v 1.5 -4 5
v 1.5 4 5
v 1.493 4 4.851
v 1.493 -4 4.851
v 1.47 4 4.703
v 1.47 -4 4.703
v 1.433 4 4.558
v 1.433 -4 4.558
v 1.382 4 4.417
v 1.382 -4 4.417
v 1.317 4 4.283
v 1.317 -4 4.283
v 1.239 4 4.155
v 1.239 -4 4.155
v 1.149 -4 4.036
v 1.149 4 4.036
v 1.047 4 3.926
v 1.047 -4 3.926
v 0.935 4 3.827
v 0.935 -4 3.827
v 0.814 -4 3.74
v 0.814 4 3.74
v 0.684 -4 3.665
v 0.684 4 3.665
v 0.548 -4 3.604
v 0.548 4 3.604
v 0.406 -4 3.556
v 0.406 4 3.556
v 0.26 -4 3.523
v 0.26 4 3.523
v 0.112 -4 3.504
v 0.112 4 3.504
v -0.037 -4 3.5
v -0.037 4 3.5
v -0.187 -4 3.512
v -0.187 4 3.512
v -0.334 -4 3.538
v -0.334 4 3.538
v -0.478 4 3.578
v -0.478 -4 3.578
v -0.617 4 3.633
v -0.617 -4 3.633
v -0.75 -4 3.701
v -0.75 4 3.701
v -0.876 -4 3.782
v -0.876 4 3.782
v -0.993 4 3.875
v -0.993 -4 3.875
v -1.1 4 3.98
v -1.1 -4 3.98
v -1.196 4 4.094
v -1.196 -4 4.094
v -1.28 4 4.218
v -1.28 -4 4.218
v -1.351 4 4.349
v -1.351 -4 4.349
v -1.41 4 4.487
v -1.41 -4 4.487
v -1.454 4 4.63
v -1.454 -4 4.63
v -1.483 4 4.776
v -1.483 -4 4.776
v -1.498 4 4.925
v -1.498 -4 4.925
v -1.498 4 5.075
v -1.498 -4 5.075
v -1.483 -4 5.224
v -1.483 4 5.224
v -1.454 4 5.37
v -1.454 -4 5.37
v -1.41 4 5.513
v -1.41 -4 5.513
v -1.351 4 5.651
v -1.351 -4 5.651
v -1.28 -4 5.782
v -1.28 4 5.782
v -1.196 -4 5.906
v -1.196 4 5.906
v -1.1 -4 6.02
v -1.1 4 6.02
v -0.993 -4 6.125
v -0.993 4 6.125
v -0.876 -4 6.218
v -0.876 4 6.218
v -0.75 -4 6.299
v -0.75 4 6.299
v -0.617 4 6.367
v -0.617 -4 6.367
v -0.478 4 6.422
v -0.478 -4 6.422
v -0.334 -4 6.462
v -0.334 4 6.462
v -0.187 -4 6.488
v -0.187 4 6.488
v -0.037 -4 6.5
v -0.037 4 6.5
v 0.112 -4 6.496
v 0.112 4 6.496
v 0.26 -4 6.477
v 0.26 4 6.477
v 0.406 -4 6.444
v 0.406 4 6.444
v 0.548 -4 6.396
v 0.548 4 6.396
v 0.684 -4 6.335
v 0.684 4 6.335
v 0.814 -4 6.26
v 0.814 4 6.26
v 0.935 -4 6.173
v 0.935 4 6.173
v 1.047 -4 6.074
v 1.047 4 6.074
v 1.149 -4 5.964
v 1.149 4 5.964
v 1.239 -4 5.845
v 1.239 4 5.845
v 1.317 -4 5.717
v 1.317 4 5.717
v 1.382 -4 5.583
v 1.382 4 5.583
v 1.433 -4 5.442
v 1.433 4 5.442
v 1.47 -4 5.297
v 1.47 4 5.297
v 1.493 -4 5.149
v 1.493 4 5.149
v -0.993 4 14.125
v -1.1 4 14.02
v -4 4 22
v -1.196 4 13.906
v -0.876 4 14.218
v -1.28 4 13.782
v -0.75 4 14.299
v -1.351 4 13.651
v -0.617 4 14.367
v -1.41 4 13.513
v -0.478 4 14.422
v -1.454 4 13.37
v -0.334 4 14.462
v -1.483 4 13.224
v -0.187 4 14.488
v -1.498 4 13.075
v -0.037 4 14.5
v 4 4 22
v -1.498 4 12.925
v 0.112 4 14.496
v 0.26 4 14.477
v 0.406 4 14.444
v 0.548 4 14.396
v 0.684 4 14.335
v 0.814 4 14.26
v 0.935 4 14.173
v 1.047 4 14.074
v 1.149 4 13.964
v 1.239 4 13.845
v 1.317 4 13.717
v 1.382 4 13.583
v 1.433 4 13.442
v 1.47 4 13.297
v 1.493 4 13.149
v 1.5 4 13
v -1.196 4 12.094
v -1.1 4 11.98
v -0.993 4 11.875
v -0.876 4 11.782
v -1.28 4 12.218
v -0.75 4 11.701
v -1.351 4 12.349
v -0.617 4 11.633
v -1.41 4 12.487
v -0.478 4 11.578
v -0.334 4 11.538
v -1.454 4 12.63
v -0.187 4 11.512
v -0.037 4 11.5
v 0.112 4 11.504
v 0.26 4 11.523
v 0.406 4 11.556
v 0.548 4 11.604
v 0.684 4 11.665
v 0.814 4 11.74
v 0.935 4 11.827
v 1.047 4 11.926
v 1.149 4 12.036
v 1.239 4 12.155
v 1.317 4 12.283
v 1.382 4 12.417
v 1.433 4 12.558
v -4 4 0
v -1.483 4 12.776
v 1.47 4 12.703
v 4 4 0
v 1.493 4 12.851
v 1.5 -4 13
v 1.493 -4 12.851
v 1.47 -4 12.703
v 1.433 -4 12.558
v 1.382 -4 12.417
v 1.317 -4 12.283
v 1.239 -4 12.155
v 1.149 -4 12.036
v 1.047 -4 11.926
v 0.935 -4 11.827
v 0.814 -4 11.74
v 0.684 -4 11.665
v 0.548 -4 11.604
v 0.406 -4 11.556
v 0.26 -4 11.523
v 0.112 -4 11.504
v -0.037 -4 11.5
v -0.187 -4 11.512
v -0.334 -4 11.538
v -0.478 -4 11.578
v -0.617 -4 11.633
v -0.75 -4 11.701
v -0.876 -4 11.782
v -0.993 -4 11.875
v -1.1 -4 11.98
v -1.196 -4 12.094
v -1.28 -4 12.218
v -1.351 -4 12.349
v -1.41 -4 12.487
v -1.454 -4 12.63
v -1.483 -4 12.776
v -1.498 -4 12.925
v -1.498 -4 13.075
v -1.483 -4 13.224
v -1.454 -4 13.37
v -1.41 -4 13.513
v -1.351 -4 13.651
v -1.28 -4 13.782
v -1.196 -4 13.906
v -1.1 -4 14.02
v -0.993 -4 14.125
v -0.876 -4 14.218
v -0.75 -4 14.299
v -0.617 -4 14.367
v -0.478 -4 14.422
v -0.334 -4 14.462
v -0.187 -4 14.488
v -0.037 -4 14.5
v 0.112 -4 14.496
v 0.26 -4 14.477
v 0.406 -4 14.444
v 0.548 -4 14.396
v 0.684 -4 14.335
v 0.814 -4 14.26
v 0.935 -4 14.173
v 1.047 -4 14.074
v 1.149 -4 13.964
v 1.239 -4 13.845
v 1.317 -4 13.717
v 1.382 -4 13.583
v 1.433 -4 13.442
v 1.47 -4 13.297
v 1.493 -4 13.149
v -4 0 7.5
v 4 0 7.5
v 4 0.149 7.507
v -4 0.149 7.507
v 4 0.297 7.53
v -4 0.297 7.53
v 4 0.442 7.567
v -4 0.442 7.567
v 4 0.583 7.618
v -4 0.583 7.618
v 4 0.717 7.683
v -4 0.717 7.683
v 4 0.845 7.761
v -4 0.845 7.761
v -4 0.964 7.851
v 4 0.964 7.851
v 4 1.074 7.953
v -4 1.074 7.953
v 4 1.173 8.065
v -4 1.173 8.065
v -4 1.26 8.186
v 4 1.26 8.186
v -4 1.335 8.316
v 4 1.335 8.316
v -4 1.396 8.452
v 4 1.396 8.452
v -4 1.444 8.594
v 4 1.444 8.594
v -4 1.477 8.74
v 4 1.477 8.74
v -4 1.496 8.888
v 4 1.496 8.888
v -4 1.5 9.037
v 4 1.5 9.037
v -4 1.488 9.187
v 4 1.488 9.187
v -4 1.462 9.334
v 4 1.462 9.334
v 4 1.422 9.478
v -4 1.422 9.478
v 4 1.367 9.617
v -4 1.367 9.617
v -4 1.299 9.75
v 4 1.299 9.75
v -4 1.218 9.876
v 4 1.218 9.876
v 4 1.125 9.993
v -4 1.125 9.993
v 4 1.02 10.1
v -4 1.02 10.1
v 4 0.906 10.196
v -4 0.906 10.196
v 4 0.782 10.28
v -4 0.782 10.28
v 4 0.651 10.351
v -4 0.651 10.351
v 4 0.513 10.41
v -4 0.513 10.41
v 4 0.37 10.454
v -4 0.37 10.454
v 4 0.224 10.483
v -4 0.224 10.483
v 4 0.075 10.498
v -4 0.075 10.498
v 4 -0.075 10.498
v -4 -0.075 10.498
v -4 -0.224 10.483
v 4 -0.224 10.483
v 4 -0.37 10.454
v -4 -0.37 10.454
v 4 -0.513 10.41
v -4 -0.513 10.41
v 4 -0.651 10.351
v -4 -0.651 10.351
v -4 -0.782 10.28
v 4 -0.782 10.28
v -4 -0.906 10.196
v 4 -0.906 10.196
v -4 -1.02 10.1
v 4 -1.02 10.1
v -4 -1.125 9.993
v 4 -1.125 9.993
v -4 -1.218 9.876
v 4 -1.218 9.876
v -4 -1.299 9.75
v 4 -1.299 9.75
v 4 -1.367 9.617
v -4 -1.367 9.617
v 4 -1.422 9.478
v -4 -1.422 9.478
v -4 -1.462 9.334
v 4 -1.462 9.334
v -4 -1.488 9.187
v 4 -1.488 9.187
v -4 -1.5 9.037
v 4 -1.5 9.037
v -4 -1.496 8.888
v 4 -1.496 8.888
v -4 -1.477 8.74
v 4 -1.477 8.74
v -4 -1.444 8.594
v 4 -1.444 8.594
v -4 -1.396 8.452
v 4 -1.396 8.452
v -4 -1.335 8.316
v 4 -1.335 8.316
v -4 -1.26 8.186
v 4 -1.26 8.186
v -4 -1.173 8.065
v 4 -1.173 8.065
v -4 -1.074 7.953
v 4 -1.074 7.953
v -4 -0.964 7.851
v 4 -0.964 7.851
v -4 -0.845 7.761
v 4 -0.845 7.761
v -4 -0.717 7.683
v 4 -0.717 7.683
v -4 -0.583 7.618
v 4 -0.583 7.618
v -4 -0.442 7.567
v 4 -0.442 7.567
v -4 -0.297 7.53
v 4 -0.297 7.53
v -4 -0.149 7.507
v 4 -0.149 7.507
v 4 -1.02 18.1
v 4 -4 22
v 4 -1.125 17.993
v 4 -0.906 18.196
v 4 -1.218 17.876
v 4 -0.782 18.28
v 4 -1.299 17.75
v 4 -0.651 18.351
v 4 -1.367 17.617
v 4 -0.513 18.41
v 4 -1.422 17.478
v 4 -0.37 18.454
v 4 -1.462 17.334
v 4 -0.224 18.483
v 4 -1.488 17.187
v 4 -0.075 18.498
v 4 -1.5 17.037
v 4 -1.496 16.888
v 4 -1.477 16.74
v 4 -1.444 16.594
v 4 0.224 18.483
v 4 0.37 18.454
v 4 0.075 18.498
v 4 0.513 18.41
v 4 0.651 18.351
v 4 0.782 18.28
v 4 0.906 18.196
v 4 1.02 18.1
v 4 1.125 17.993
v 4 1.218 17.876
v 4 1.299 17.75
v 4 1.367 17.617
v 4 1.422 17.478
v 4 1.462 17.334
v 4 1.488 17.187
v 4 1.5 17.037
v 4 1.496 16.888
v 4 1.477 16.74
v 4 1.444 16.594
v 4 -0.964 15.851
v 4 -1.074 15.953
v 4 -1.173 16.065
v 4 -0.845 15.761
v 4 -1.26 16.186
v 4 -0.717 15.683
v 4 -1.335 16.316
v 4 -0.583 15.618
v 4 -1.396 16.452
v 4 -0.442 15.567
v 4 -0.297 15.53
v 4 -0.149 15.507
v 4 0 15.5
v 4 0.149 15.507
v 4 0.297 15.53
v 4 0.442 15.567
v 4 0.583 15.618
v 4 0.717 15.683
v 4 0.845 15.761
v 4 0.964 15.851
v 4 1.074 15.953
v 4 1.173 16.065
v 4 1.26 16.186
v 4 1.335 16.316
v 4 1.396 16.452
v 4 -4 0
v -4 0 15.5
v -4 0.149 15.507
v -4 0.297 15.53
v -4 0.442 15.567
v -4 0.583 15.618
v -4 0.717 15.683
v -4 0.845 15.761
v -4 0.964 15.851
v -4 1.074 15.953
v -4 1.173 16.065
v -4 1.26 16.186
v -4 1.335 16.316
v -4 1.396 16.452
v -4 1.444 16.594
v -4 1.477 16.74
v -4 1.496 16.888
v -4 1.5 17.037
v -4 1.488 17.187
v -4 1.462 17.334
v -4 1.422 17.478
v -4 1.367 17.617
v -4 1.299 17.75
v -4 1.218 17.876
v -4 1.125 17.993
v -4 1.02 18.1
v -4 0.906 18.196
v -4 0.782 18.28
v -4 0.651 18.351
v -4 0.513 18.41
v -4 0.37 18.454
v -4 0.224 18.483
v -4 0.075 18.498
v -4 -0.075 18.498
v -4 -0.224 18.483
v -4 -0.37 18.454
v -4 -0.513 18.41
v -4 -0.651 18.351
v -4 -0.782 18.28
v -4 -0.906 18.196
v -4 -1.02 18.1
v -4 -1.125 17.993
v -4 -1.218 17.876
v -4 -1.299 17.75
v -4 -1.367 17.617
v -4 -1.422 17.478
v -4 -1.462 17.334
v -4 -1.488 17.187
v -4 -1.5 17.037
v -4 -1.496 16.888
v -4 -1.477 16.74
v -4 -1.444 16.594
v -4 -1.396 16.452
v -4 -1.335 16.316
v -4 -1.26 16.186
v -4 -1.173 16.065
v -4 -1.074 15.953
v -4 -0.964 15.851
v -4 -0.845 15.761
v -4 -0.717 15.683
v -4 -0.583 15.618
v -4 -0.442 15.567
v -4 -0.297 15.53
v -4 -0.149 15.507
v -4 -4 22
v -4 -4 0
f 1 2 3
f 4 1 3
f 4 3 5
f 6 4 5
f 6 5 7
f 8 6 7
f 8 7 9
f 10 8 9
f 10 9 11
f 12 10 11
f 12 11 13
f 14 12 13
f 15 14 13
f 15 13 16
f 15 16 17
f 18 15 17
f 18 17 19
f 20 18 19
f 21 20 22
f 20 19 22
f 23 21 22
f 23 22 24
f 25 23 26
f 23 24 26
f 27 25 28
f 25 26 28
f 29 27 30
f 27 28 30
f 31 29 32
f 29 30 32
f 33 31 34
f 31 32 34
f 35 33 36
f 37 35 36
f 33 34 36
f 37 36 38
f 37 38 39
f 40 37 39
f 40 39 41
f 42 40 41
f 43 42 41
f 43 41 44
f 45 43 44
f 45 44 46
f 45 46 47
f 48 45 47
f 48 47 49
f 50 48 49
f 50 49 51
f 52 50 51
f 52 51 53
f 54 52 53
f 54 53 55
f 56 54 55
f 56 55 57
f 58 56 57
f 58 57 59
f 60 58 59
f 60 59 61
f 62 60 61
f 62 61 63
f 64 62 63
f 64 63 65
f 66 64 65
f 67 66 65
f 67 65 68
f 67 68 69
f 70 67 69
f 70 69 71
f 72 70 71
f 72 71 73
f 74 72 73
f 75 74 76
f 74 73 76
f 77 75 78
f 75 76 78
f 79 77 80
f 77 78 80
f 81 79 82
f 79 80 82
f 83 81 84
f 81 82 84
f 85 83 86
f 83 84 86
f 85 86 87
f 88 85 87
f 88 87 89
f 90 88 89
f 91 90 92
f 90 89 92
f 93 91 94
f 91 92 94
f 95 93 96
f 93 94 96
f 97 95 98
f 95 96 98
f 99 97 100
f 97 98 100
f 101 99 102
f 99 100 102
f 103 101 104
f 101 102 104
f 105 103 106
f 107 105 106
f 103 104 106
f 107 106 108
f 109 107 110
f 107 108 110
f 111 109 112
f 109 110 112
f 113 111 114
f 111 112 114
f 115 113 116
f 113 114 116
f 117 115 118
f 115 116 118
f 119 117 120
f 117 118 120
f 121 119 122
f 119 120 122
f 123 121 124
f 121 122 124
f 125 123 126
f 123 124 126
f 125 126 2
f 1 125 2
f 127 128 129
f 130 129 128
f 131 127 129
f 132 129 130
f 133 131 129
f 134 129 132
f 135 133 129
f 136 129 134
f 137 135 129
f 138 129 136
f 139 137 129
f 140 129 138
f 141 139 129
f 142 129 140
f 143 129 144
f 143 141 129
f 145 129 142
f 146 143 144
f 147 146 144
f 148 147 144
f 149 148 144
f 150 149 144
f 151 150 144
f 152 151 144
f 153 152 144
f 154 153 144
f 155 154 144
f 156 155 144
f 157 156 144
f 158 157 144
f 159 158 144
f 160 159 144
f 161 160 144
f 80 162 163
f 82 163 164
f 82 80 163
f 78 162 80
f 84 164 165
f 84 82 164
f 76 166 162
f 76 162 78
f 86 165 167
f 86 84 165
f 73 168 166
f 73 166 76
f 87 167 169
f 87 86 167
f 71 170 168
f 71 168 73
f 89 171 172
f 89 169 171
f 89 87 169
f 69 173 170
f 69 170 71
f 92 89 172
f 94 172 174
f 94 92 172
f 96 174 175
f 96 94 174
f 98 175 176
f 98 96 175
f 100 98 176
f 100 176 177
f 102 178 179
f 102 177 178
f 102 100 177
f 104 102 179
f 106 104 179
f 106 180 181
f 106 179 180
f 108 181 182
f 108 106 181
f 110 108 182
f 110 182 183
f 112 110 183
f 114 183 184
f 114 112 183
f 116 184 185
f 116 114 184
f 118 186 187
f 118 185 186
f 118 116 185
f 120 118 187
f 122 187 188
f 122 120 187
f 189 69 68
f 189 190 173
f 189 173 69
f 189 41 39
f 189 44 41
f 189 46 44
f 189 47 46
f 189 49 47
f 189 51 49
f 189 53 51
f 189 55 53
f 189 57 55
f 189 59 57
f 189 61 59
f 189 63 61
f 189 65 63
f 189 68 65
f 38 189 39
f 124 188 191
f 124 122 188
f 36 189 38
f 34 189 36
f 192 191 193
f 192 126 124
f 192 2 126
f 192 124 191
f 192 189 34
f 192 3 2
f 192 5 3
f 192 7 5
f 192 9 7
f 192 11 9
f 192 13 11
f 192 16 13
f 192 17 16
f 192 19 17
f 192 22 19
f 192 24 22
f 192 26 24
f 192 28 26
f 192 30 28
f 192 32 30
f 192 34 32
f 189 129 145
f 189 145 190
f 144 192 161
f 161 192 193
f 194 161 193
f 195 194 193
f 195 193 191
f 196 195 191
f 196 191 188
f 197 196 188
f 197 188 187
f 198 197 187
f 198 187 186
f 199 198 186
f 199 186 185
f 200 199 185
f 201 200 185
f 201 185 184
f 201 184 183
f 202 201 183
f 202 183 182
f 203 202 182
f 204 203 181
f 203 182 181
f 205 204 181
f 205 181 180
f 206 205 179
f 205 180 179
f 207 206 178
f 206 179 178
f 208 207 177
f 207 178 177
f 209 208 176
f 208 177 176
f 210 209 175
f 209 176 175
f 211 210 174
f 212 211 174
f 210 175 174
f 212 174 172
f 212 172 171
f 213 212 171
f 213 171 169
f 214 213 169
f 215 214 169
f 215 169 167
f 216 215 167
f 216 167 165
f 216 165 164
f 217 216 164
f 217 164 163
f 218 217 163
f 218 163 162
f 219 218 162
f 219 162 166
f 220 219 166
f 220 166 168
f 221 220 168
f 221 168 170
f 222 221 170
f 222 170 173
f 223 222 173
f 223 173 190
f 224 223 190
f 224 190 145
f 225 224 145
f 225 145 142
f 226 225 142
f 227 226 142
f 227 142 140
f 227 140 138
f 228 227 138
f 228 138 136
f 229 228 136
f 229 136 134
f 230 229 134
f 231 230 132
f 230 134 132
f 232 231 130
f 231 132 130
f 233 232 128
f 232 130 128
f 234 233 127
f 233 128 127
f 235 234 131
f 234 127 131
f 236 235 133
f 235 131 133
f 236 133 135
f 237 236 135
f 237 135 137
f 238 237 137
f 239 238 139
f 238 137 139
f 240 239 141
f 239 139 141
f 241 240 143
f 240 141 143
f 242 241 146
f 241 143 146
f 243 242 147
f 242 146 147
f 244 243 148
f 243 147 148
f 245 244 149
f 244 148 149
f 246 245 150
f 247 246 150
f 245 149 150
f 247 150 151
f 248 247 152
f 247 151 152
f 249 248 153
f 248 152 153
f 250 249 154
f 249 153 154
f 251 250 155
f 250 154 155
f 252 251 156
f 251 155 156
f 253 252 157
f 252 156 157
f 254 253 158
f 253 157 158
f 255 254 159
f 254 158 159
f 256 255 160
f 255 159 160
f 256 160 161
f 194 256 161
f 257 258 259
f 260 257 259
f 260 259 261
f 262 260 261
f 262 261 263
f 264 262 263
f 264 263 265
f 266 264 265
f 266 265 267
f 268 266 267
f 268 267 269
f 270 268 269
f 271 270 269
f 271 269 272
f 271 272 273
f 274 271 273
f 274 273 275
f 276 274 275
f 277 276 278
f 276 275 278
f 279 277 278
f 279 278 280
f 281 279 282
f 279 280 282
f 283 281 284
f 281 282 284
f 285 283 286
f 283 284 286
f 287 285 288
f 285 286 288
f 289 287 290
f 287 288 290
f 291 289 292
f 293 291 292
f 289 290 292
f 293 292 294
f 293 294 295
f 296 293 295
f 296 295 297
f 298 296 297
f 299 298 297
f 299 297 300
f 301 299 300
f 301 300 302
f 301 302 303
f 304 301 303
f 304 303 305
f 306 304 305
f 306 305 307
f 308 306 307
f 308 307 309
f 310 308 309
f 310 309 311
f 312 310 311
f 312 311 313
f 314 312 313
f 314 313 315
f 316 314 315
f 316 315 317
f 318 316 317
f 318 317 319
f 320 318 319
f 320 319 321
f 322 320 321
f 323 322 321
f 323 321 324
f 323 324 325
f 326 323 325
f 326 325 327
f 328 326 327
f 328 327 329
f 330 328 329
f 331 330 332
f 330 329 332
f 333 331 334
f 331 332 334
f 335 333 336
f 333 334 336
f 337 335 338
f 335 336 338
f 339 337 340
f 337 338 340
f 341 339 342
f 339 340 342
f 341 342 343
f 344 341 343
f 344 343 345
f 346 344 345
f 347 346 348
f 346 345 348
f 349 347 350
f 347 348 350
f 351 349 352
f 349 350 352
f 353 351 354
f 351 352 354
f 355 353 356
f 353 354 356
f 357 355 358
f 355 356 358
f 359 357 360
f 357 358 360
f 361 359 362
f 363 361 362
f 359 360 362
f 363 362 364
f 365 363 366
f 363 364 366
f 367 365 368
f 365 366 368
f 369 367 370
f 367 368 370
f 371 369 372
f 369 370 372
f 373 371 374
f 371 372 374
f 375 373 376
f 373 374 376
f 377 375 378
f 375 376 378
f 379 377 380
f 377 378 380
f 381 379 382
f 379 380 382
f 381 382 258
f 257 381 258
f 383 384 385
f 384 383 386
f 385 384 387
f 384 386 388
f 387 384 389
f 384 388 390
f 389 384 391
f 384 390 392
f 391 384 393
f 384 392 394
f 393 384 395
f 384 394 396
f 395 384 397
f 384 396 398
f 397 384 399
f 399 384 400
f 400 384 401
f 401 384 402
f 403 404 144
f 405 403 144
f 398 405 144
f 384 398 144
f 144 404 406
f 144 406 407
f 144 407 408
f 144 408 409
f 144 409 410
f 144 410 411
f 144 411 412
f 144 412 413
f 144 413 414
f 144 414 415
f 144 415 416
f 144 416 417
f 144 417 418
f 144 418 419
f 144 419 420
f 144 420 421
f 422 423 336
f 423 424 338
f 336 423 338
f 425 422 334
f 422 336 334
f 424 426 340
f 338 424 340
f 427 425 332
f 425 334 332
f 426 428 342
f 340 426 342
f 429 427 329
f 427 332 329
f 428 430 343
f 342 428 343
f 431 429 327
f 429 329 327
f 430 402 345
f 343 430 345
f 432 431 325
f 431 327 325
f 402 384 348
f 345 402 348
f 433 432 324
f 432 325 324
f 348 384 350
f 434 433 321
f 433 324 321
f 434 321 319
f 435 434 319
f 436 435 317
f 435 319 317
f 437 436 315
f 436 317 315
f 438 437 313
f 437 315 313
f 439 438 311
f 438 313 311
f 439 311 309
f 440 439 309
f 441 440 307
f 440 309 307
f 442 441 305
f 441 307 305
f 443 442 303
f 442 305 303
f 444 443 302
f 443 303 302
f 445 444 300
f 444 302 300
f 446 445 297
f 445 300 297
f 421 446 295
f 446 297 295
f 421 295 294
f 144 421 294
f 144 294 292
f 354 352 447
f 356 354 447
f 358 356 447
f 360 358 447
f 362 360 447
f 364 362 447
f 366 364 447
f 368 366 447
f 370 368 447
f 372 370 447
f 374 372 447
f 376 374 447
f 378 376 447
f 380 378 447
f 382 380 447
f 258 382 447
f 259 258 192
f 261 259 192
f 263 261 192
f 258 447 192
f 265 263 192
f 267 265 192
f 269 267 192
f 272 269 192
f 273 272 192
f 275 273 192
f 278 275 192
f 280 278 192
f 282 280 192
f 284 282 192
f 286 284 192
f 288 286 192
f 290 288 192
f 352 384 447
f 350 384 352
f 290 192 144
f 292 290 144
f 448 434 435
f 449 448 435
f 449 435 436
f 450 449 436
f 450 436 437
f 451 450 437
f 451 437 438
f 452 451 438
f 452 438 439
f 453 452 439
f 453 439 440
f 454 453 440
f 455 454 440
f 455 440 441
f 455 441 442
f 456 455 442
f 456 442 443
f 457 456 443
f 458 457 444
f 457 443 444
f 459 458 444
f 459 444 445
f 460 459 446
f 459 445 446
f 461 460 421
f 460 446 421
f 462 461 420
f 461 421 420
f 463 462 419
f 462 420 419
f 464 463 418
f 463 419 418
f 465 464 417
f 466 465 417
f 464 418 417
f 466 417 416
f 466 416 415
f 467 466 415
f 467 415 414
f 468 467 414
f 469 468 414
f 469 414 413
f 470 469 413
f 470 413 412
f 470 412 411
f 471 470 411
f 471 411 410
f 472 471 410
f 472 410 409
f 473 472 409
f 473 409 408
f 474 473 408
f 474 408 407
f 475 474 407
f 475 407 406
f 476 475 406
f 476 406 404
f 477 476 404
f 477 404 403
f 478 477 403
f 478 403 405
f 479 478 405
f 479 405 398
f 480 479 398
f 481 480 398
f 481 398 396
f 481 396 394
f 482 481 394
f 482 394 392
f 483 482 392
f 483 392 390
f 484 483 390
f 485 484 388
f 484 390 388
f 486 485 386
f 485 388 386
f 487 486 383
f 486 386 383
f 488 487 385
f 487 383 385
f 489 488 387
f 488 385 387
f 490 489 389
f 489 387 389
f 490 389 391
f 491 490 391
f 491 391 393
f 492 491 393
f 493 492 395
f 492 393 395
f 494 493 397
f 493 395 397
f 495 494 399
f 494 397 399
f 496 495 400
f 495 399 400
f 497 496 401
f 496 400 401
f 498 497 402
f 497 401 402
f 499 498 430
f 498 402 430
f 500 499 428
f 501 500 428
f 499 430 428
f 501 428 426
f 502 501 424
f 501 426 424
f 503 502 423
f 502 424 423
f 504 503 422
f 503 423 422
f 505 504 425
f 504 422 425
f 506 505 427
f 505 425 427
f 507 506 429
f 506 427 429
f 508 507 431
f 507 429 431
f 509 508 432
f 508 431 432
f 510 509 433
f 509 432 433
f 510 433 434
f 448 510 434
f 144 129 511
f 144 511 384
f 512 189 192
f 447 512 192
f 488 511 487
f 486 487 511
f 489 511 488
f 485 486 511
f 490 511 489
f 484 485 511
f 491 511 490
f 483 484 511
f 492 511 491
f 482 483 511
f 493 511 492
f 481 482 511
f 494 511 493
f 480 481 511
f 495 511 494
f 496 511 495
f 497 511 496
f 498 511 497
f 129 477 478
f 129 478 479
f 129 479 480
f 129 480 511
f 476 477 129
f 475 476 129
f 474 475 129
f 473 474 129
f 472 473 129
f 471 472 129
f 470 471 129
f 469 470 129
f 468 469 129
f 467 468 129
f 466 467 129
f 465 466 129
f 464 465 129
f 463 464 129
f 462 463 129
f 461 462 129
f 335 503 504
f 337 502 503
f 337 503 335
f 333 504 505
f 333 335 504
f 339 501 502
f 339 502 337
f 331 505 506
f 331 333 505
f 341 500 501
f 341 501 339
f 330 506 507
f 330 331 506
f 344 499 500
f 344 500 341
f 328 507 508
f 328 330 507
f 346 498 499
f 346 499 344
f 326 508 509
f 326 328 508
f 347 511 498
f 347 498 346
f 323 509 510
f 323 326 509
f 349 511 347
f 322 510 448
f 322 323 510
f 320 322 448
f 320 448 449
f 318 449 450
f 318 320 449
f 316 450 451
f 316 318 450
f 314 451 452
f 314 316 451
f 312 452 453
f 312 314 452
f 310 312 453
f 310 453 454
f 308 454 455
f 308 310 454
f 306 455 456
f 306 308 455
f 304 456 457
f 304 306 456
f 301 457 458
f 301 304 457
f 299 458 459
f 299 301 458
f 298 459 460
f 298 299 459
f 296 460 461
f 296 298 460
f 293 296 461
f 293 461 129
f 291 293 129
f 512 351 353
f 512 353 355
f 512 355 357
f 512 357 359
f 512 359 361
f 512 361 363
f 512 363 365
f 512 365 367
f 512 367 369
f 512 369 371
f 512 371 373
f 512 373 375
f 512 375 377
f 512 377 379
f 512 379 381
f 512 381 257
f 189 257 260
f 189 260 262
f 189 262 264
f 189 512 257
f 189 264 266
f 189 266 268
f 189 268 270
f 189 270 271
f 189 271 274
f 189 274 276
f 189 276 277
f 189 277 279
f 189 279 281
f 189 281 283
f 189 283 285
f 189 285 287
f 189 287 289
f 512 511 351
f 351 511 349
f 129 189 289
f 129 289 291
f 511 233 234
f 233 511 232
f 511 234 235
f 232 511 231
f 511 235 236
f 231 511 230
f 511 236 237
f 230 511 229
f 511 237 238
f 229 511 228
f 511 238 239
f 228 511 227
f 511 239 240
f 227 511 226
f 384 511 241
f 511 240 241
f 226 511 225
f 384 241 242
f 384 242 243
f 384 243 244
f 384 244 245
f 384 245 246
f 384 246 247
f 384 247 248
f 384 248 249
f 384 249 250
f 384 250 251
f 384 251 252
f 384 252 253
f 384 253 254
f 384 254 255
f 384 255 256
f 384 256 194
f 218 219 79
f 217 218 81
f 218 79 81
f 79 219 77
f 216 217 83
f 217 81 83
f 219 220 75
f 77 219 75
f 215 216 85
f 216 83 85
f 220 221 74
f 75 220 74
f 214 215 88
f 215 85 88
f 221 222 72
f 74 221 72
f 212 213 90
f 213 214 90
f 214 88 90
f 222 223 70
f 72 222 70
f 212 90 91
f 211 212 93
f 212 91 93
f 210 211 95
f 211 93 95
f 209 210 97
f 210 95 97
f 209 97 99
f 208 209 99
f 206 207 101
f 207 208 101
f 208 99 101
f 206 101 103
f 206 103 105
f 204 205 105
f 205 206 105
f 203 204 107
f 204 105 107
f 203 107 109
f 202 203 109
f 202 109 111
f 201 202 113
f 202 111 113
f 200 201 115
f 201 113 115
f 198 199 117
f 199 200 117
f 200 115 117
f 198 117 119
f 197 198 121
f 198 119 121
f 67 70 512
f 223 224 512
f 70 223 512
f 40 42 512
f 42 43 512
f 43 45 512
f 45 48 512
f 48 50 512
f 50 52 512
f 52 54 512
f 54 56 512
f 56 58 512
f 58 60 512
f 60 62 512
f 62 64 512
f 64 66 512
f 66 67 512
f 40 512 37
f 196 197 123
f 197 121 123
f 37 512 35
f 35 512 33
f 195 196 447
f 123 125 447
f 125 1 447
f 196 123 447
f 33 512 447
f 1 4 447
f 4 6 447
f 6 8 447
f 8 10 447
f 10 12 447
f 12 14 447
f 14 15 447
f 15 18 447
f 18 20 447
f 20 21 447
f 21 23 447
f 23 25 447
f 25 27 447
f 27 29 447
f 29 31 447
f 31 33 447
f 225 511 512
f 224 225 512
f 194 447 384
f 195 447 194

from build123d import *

# Parameters (mm, degrees)
SKETCH_1_W          = 8
SKETCH_1_H          = 8
EXTRUDE_1_DEPTH     = 22
SKETCH_2_R          = 1.5
CUT_EXTRUDE_1_DEPTH = 9
SKETCH_3_R          = 1.5
CUT_EXTRUDE_2_DEPTH = 9


with BuildPart() as part:
    # 草图1 → 凸台-拉伸1 (new body)
    with BuildSketch(Plane.XY):
        Rectangle(SKETCH_1_W, SKETCH_1_H)
    extrude(amount=EXTRUDE_1_DEPTH)

    # 草图2 → 切除-拉伸1 (cut, through all)
    with BuildSketch(Plane(origin=(0, 4, 0), x_dir=(1, 0, 0), z_dir=(0, 1, 0))):
        with Locations((0, -5)):
            Circle(SKETCH_2_R)
        with Locations((0, -13)):
            Circle(SKETCH_2_R)
    extrude(amount=-CUT_EXTRUDE_1_DEPTH, mode=Mode.SUBTRACT)

    # 草图3 → 切除-拉伸2 (cut, through all)
    with BuildSketch(Plane(origin=(4, 0, 0), x_dir=(0, 0, -1), z_dir=(1, 0, 0))):
        with Locations((-17, 0)):
            Circle(SKETCH_3_R)
        with Locations((-9, 0)):
            Circle(SKETCH_3_R)
    extrude(amount=-CUT_EXTRUDE_2_DEPTH, mode=Mode.SUBTRACT)


solid = part.part
